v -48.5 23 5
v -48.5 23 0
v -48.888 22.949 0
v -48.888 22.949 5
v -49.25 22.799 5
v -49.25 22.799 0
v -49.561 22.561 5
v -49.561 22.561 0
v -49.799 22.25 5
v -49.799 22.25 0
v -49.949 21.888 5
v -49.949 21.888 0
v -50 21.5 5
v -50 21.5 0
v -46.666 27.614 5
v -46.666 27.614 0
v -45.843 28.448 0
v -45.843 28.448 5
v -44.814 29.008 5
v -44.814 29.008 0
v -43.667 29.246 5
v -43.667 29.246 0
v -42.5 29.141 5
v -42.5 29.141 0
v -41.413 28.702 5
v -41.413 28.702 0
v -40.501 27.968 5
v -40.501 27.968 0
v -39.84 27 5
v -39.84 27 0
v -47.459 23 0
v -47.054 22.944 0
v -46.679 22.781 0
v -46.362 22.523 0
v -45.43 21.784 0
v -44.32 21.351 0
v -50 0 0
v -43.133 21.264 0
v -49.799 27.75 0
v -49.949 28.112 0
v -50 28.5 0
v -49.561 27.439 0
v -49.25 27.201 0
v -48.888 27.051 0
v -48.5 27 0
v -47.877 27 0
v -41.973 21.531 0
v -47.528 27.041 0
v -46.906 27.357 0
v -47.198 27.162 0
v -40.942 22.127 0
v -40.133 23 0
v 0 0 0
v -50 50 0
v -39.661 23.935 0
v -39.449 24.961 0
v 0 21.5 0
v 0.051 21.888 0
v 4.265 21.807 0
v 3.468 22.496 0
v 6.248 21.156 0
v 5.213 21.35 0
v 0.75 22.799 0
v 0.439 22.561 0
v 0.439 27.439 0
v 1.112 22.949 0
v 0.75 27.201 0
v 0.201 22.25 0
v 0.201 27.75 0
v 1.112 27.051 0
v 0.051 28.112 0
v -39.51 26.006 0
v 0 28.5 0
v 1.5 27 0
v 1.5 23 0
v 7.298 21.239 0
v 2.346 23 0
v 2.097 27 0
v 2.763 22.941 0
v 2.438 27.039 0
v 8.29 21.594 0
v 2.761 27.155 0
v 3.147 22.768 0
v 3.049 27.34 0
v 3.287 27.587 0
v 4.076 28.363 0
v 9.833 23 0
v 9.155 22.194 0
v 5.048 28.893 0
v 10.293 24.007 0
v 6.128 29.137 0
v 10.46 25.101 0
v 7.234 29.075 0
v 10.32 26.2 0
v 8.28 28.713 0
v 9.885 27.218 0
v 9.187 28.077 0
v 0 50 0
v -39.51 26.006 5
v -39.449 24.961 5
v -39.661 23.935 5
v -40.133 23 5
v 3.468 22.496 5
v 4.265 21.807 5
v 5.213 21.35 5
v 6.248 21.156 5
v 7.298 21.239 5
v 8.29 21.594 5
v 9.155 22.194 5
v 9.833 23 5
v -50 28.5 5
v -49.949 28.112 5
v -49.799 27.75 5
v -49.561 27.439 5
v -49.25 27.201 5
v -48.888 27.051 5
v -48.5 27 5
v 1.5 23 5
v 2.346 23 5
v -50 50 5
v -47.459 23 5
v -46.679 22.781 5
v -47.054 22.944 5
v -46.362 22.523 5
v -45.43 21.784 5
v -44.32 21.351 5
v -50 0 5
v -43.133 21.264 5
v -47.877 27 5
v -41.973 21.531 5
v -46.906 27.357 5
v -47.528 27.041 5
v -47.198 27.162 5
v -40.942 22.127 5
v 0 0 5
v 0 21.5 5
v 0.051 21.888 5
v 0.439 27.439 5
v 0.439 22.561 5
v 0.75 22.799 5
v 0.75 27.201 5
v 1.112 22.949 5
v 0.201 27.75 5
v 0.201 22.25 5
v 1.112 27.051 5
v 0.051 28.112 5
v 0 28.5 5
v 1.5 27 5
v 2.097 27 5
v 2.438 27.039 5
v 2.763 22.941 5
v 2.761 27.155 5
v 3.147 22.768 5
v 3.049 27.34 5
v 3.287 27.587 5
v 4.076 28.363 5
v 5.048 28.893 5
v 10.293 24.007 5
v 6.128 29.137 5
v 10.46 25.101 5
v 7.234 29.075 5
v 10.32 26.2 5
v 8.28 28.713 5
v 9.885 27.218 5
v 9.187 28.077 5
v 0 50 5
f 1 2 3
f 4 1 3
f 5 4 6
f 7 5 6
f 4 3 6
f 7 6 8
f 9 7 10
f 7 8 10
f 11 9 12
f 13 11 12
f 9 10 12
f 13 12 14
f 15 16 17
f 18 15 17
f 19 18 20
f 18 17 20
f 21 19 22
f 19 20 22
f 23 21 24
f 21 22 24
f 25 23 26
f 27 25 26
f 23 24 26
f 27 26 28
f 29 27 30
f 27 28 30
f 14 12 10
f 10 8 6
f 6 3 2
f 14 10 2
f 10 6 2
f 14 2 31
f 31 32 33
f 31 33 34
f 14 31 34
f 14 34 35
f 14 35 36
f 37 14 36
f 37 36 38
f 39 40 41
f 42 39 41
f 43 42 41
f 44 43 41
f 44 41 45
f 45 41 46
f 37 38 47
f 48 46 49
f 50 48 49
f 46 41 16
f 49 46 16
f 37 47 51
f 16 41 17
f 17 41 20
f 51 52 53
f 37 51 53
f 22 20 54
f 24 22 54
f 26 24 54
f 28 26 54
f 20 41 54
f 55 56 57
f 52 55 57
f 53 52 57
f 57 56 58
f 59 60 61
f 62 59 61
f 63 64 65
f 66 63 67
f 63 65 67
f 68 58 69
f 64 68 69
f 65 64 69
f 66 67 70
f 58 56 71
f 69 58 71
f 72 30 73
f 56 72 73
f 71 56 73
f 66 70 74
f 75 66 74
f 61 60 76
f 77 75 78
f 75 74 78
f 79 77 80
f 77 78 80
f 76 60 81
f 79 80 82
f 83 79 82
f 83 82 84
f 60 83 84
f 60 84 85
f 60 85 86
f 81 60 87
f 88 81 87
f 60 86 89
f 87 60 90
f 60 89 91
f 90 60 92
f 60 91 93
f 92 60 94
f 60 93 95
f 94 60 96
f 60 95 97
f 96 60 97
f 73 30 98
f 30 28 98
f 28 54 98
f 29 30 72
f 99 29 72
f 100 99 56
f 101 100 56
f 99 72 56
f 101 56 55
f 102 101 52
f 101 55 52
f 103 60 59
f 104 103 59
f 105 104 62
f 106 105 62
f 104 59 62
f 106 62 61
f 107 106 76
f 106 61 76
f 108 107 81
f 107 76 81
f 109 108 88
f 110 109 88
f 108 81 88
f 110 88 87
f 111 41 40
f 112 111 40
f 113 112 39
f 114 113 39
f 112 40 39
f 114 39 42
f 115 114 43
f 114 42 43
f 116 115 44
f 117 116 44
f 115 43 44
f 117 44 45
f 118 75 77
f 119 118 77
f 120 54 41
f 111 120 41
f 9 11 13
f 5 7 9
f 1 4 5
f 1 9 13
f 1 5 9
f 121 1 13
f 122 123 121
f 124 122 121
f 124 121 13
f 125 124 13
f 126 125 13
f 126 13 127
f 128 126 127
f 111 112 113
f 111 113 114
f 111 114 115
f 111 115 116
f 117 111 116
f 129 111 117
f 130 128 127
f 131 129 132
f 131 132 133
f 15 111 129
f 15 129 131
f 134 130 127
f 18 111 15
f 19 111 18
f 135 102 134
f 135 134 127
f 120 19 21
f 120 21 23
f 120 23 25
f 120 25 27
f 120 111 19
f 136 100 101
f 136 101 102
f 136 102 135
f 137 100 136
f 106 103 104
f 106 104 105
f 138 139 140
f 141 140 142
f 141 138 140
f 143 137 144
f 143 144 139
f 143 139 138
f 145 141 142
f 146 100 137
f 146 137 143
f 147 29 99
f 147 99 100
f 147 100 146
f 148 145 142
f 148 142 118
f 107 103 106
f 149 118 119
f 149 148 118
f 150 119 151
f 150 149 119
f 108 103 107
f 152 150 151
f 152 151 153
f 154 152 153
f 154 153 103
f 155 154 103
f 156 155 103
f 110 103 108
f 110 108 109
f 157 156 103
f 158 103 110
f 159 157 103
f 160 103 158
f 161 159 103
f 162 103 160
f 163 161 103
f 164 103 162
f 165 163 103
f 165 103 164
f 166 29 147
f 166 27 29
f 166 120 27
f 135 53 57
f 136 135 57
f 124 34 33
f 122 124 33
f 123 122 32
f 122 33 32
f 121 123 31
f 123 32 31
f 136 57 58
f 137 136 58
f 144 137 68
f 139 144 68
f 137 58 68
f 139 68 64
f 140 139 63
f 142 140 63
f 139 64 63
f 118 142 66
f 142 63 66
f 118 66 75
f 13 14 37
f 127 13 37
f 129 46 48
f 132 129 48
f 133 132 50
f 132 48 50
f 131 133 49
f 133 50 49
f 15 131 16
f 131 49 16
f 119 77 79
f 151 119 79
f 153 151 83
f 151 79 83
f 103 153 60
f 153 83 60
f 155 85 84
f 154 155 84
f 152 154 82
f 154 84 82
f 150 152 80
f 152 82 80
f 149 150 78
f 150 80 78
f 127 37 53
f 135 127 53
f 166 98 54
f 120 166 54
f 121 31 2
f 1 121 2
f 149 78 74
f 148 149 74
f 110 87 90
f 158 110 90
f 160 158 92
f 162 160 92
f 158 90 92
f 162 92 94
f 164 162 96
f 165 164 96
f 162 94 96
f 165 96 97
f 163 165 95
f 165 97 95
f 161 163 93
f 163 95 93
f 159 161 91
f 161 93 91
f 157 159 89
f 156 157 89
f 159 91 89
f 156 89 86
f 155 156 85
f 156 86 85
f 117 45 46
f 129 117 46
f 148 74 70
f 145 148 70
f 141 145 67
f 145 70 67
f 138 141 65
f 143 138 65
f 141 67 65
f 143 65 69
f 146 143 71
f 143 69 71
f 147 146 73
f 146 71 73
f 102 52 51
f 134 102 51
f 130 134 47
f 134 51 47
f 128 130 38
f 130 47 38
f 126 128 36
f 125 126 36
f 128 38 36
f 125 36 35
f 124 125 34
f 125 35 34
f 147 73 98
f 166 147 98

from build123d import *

# Parameters (mm, degrees)
F1_DEPTH = 5


with BuildPart() as f1:
    # F0 (on Top) → F1 (new body)
    with BuildSketch(Plane.XY):
        with BuildLine():
            Line((0, 28.5), (0, 50))
            Line((0, 50), (-50, 50))
            Line((-50, 50), (-50, 28.5))
            ThreePointArc((-50, 28.5), (-49.56066, 27.43934), (-48.5, 27))
            Line((-48.5, 27), (-47.876976, 27))
            ThreePointArc((-47.876976, 27), (-47.198184, 27.162375), (-46.66635, 27.614345))
            ThreePointArc((-46.66635, 27.614345), (-43.079484, 29.236499), (-39.839877, 27))
            ThreePointArc((-39.839877, 27), (-39.448681, 24.960662), (-40.132594, 23))
            ThreePointArc((-40.132594, 23), (-43.132912, 21.264252), (-46.362337, 22.523436))
            ThreePointArc((-46.362337, 22.523436), (-46.86111, 22.87571), (-47.458959, 23))
            Line((-47.458959, 23), (-48.5, 23))
            ThreePointArc((-48.5, 23), (-49.56066, 22.56066), (-50, 21.5))
            Line((-50, 21.5), (-50, 0))
            Line((-50, 0), (0, 0))
            Line((0, 0), (0, 21.5))
            ThreePointArc((0, 21.5), (0.43934, 22.56066), (1.5, 23))
            Line((1.5, 23), (2.346308, 23))
            ThreePointArc((2.346308, 23), (2.961343, 22.868113), (3.468224, 22.495643))
            ThreePointArc((3.468224, 22.495643), (6.775996, 21.163191), (9.832615, 23))
            ThreePointArc((9.832615, 23), (8.755451, 28.426496), (3.287213, 27.586552))
            ThreePointArc((3.287213, 27.586552), (2.760678, 27.154606), (2.097418, 27))
            Line((2.097418, 27), (1.5, 27))
            ThreePointArc((1.5, 27), (0.43934, 27.43934), (0, 28.5))
        make_face()
    extrude(amount=F1_DEPTH)


solid = f1.part
